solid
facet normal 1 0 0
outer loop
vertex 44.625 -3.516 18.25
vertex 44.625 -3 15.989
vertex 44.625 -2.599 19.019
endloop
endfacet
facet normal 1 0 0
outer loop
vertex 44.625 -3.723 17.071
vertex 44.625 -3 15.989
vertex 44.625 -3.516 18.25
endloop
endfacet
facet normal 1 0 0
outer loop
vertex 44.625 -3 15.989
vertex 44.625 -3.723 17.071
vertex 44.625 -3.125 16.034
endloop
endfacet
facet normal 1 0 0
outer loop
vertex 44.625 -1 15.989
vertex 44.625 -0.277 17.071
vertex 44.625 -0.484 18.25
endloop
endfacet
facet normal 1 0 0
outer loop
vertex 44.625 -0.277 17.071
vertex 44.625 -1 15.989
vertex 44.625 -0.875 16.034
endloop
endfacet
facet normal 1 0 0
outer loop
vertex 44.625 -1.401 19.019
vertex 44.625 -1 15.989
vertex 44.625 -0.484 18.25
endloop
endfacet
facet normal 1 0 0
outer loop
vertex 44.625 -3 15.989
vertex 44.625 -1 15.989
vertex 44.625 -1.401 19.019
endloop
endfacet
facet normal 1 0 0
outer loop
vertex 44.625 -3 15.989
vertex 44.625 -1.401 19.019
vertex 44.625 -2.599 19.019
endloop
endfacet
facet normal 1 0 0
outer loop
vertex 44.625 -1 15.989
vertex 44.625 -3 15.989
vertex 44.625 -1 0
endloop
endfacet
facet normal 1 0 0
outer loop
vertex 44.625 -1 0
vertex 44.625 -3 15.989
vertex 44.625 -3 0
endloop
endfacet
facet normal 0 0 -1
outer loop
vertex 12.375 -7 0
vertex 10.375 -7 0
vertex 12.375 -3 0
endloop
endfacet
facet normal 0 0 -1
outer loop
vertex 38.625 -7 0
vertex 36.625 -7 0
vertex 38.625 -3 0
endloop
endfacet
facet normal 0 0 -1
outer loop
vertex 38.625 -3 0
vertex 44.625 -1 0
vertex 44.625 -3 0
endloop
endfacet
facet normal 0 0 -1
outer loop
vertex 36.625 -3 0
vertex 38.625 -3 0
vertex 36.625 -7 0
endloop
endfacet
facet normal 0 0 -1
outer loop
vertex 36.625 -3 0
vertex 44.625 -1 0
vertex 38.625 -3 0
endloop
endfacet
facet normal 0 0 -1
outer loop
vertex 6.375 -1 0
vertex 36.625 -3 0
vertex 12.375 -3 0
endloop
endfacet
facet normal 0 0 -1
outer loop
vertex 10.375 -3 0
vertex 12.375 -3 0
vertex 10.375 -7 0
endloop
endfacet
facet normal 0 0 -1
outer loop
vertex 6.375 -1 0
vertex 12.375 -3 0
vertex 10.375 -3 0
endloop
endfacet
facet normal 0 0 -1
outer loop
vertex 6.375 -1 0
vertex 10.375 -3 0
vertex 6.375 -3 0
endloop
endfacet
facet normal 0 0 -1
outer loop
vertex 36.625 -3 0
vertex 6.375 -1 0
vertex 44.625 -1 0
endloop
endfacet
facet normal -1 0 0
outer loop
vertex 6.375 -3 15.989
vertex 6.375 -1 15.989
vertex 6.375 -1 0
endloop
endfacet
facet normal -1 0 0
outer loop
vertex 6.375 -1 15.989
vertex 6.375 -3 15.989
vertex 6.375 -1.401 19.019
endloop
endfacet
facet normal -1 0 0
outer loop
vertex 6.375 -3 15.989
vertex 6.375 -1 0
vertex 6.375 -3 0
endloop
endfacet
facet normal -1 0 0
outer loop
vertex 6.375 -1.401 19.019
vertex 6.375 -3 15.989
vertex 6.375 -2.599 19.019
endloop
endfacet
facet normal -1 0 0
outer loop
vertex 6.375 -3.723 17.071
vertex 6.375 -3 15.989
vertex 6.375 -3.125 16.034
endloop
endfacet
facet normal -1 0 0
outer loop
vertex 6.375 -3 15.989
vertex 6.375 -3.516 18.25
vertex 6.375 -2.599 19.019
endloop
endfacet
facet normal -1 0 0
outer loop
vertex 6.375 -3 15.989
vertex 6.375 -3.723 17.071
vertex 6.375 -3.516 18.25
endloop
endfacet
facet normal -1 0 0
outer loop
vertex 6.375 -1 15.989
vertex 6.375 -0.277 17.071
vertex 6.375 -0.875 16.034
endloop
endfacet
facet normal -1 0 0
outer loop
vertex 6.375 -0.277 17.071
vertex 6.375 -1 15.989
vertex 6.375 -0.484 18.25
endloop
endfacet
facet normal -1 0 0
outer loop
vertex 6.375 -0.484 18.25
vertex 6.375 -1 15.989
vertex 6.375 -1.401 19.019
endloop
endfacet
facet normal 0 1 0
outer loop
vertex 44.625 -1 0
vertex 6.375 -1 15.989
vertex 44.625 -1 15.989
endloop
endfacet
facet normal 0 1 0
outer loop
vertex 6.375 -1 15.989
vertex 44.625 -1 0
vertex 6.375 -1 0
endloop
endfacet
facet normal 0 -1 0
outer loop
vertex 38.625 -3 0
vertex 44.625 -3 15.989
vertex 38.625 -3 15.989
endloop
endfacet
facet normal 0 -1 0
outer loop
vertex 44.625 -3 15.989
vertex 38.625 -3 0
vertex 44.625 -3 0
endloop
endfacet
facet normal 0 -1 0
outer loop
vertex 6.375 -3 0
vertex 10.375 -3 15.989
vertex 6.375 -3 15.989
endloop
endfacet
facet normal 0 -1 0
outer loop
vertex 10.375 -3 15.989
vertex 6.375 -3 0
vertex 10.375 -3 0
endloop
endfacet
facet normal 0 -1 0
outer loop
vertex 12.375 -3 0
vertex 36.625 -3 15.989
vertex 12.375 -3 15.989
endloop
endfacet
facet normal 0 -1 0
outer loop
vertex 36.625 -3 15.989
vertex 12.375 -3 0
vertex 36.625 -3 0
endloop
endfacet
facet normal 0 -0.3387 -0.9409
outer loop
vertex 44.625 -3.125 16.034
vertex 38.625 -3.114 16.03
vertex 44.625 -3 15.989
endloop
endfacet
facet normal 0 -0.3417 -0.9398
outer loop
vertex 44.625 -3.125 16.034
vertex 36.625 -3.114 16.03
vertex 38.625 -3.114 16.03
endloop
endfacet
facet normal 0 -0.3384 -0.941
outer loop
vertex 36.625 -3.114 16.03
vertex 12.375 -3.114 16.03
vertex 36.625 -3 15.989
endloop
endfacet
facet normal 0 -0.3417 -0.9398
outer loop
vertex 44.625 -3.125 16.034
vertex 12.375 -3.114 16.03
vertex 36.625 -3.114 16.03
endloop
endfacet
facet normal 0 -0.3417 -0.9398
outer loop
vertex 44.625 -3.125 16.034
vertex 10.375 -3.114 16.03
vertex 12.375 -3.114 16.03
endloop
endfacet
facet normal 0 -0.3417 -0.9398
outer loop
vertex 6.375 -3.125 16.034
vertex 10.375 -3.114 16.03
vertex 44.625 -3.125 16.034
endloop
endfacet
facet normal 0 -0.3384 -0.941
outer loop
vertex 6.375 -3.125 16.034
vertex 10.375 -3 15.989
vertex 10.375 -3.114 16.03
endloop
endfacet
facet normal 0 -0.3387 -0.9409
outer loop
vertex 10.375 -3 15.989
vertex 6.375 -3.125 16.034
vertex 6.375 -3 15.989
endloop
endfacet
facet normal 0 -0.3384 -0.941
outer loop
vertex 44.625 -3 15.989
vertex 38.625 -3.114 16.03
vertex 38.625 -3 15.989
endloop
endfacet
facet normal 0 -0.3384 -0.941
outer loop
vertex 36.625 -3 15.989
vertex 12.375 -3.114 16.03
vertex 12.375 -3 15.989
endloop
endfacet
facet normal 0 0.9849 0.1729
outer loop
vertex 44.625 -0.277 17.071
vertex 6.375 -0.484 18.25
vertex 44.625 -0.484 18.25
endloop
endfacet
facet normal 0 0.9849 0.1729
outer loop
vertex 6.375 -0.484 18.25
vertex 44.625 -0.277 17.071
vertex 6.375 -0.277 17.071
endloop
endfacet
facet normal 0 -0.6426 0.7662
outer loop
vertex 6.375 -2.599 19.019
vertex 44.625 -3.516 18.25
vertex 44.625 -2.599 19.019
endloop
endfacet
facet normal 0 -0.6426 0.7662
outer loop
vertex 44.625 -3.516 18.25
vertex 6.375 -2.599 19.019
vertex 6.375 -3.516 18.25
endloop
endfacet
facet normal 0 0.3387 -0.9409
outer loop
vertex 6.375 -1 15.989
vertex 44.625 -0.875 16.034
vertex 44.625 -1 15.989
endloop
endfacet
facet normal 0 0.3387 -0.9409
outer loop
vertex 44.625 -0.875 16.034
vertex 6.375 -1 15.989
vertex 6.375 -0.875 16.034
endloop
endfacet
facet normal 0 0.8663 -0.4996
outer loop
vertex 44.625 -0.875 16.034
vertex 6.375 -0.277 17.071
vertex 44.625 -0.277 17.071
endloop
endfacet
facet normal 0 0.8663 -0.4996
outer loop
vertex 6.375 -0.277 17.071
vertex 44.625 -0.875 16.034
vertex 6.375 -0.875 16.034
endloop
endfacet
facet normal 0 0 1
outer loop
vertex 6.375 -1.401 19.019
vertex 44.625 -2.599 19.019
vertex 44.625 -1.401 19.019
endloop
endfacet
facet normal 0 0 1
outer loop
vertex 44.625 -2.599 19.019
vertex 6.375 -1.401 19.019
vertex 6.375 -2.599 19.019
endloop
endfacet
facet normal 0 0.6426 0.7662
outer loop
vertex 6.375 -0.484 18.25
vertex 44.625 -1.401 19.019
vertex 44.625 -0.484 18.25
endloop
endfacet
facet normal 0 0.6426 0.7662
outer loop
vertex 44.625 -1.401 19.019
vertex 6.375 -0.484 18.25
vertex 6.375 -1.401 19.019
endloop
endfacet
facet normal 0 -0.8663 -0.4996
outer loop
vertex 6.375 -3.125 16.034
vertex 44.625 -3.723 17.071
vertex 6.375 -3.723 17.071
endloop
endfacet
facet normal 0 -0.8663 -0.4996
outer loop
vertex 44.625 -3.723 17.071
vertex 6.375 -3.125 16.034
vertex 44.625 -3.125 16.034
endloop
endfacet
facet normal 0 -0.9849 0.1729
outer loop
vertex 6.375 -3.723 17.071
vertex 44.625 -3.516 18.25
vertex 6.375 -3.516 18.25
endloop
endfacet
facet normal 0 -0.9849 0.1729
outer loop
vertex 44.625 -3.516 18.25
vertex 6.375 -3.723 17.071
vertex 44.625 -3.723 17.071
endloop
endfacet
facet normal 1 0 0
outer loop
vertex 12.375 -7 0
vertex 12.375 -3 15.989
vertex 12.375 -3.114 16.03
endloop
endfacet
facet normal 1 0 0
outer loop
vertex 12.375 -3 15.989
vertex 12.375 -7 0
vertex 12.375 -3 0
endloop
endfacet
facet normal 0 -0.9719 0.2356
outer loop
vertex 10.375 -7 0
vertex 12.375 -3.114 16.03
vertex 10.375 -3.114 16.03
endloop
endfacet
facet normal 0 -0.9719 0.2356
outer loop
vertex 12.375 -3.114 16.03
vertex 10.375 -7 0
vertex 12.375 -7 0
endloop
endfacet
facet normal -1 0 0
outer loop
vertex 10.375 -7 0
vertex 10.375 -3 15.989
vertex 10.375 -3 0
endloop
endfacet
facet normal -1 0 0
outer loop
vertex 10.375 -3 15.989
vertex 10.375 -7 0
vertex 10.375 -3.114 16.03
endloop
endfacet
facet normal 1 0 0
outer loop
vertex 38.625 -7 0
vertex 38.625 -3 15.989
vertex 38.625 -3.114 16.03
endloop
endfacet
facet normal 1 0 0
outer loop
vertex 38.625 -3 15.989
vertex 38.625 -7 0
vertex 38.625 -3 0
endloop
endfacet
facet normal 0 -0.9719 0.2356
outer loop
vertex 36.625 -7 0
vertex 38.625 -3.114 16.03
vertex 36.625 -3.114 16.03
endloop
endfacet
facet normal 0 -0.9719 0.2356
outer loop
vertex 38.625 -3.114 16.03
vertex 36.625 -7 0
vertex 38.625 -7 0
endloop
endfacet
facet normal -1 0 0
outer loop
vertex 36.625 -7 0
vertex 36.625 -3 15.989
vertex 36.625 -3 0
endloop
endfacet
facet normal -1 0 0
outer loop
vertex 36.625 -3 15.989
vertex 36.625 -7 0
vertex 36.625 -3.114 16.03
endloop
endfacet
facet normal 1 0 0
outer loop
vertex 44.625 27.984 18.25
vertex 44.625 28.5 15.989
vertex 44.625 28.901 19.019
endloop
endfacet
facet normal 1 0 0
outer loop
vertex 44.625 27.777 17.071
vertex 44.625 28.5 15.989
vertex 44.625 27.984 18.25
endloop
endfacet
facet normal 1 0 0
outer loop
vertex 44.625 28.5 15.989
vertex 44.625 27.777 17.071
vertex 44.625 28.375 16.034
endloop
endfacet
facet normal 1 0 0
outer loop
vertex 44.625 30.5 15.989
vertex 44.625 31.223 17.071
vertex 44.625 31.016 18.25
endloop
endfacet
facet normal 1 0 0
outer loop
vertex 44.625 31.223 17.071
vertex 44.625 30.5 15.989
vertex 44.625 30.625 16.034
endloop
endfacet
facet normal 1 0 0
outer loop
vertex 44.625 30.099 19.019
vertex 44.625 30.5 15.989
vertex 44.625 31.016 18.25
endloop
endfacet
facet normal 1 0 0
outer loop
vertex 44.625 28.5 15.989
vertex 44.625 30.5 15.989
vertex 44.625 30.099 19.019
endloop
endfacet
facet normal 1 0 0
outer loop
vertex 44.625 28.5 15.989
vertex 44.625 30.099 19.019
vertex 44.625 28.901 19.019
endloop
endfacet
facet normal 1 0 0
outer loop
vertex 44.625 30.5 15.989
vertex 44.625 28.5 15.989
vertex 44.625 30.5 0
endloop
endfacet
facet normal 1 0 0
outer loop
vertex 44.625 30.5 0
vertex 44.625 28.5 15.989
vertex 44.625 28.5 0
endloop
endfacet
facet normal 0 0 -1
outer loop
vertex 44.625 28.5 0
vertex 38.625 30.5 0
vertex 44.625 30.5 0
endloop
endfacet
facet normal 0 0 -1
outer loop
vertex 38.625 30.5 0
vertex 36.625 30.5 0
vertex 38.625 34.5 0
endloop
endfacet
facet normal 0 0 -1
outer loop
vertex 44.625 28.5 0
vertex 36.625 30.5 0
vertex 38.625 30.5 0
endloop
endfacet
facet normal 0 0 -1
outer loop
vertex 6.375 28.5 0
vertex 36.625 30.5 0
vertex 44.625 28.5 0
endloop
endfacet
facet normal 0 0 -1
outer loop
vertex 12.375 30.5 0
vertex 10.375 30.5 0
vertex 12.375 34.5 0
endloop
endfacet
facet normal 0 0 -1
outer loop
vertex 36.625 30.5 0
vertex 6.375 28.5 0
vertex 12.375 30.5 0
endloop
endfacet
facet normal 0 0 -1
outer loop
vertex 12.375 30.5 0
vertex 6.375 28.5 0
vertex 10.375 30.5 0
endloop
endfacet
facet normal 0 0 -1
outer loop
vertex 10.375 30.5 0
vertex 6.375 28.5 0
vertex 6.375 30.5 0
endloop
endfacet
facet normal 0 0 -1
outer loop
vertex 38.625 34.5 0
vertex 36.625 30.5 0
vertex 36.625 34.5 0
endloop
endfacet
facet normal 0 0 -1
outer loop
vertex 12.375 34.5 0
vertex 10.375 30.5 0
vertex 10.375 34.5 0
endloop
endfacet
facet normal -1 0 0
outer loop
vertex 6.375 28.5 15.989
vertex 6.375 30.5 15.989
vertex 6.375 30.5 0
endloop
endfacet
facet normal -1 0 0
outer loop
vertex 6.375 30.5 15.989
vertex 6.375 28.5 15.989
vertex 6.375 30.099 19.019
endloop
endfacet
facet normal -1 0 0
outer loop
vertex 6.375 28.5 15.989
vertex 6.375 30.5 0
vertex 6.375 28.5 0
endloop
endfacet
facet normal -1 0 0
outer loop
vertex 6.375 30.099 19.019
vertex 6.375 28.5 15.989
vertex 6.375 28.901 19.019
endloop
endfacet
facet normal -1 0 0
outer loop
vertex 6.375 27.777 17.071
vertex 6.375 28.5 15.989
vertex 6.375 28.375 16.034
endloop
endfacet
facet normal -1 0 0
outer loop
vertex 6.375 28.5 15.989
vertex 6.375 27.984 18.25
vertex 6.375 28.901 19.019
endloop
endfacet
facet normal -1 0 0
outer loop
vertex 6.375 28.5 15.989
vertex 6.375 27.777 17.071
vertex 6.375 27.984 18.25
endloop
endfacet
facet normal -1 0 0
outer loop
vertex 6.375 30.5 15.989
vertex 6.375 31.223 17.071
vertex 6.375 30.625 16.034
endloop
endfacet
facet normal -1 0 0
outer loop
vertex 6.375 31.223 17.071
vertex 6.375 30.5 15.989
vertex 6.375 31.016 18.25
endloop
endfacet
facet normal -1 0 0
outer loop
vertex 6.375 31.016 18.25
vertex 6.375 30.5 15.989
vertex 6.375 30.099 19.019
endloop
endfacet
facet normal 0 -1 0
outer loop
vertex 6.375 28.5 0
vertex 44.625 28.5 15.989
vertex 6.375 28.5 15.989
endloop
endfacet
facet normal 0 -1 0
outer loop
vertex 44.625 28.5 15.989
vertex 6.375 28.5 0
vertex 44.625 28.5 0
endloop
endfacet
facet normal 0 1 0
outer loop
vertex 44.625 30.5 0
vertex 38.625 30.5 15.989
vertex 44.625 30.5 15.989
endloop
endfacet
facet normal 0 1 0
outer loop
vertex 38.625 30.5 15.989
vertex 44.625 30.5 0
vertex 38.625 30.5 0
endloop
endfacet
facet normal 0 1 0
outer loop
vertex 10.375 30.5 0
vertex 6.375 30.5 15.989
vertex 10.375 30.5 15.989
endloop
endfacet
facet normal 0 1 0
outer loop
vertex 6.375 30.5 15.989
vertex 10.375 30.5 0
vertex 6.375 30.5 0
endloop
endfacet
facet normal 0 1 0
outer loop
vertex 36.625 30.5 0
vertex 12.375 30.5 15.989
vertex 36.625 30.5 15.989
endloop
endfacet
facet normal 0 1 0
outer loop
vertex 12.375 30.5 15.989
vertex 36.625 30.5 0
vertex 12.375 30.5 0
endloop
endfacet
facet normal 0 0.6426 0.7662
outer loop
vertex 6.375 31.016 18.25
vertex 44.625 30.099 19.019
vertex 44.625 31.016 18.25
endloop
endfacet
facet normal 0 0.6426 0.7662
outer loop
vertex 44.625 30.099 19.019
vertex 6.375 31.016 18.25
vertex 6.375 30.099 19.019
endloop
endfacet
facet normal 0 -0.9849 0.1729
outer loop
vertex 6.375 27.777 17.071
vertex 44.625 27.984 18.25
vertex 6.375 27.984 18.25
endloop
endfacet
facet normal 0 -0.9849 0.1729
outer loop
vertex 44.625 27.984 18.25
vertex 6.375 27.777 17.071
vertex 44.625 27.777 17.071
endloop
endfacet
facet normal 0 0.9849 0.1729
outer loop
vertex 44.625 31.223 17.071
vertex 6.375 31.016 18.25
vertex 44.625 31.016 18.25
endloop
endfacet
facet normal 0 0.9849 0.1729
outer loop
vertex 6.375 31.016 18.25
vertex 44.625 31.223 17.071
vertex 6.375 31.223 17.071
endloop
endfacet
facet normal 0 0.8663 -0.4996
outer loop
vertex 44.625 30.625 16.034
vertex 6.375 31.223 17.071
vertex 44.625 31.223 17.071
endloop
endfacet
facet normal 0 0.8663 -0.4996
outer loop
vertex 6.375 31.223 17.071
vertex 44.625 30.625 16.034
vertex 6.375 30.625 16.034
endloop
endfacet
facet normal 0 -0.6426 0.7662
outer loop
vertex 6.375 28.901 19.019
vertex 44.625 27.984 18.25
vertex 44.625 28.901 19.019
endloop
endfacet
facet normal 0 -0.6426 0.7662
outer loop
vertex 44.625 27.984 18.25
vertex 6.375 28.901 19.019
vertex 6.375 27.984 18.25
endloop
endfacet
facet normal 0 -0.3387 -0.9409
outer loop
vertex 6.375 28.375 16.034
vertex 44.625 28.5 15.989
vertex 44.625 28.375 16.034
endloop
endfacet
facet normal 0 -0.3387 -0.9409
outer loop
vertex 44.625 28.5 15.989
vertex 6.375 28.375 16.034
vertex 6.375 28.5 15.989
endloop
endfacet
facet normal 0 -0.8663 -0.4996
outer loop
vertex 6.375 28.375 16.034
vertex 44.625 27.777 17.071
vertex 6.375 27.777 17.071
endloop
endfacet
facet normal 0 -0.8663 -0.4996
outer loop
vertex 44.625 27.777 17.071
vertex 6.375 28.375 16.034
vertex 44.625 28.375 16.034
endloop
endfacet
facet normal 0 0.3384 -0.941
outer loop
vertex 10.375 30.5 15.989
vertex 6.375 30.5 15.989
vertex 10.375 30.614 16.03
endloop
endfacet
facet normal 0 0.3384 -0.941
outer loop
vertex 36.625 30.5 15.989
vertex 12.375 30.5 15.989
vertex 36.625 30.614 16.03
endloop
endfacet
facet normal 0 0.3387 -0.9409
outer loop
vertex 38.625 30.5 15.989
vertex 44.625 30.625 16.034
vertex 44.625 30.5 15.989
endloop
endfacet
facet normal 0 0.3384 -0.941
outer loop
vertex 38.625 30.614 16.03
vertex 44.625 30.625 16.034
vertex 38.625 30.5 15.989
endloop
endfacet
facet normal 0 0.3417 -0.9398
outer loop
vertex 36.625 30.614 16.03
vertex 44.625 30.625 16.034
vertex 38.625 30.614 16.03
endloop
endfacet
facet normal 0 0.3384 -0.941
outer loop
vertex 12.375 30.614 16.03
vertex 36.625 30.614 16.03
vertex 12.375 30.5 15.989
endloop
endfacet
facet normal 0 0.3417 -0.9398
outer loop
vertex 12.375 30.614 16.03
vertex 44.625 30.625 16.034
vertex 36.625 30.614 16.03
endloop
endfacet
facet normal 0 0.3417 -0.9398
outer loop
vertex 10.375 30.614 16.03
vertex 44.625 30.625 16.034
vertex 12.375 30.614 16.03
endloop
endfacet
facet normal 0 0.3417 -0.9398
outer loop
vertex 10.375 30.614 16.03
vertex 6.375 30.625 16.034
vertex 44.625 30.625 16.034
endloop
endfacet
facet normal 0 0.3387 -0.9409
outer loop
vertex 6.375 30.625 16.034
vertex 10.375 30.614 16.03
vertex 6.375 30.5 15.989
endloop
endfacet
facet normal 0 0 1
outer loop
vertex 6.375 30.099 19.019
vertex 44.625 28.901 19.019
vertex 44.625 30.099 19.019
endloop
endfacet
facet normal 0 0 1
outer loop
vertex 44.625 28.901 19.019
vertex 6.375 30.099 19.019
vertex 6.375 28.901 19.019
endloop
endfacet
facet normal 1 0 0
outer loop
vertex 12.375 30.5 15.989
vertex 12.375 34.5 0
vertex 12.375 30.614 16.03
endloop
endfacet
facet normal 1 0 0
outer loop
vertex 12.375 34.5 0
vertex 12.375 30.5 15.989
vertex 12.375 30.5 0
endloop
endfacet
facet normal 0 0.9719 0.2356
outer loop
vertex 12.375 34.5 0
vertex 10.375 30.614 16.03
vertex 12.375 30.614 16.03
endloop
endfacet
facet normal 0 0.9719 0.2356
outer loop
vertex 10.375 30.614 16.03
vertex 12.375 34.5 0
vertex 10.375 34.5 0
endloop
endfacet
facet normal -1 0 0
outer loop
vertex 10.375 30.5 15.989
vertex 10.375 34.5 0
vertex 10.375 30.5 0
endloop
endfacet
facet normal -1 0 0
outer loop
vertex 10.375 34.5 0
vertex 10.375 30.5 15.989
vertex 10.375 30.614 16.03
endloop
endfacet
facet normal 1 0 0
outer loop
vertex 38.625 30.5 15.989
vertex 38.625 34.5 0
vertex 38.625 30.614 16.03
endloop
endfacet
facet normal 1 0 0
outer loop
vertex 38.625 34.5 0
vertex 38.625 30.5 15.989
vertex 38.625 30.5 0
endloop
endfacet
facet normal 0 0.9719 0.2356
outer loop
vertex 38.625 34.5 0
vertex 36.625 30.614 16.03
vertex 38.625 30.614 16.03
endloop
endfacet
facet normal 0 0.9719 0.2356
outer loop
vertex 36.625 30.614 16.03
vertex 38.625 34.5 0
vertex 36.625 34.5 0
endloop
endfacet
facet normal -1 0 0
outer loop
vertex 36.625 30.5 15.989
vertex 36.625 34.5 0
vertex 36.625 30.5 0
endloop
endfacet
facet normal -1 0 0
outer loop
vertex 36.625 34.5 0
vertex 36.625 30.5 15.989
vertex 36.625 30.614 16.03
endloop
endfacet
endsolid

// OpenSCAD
// file: battery.scad
include <values.scad>;

module battery() {
    cube([BATTERY_WIDTH, BATTERY_LENGTH, BATTERY_HEIGHT]);
}
// file: basic_shapes.scad
module hole_array(xs, diameter, height, y = 0, z = 0) {
    for (x = xs) {
        translate([x, y, z]) {
            cylinder(
                d = diameter,
                h = height
            );
        }
    }
}

module flat_top_rectangular_pyramid(
    top_width = 0,
    top_length = 0,

    bottom_width = 0,
    bottom_length = 0,

    height = 0,

    top_x = undef,
    top_y = undef,

    top_weight_x = .5,
    top_weight_y = .5
) {
    top_x = top_x != undef
        ? top_x
        : (bottom_width - top_width) * top_weight_x;
    top_y = top_y != undef
        ? top_y
        : (bottom_length - top_length) * top_weight_y;

    max_difference = max(bottom_width - top_width, bottom_length - top_length);
    height = height == undef
        ? max_difference / 2
        : height;

    polyhedron(
        [
            [0, 0, 0],
            [bottom_width, 0, 0],
            [bottom_width, bottom_length, 0],
            [0, bottom_length, 0],
            [top_x, top_y, height],
            [top_width + top_x, top_y, height],
            [top_width + top_x, top_length + top_y, height],
            [top_x, top_length + top_y, height]
        ], [
            [0, 1, 2, 3],
            [4, 5, 1, 0],
            [7, 6, 5, 4],
            [5, 6, 2, 1],
            [6, 7, 3, 2],
            [7, 4, 0, 3]
        ]
    );
}

module rounded_cube(dimensions, radius, $fn = $fn) {
    positions = [
        [radius, radius, radius],
        [dimensions.x - radius, radius, radius],
        [dimensions.x - radius, dimensions.y - radius, radius],
        [radius, dimensions.y - radius, radius],
        [radius, radius, dimensions.z - radius],
        [dimensions.x - radius, radius, dimensions.z - radius],
        [dimensions.x - radius, dimensions.y - radius, dimensions.z - radius],
        [radius, dimensions.y - radius, dimensions.z - radius],
    ];

    hull() {
        for (position = positions) {
            translate(position) sphere(r = radius);
        }
    }
}

module rounded_cube_cutout(dimensions, radius, $fn = $fn) {
    e = 0.05678;

    width = dimensions[0] + e * 2;
    length = dimensions[1] + e * 2;
    height = dimensions[2] + e * 2;

    translate([-e, -e, -e]) {
        difference() {
            cube([width, length, height]);

            translate([-e, -e, -e]) {
                rounded_cube(
                    [
                        width + e * 2,
                        length + e * 2,
                        height + e * 2
                    ],
                    radius = radius,
                    $fn = $fn
                );
            }
        }
    }
}

module support_wall(
    dimensions,
    is_back = true,
    railing_diameter = 3.5,
    support_width = 2,
    support_length = 4,
    gutter = 4
) {
    railing_z = railing_diameter / 4;

    module _support(height = dimensions[2], depth = support_length) {
        translate([0, -depth, 0]) {
            flat_top_rectangular_pyramid(
                top_width = support_width,
                top_length = 0,
                bottom_width = support_width,
                bottom_length = support_length,
                height = height,
                top_weight_y = 1
            );
        }
    }

    translate(is_back ? [0, dimensions[1], 0] : [0, 0, 0]) {
        mirror(is_back ? [0, 1, 0] : [0, 0, 0]) {
            cube(dimensions);

            translate([0, dimensions[1] / 2, dimensions[2] + railing_z]) {
                rotate([0, 90, 0]) {
                    cylinder(
                        d = railing_diameter,
                        h = dimensions[0],
                        $fn = 9
                    );
                }
            }

            translate([gutter, 0, 0]) {
                _support();
            }
            translate([dimensions[0] - support_length - gutter, 0, 0]) {
                _support();
            }
        }
    }
}
// file: values.scad
PCB_WIDTH = 114.3;
PCB_LENGTH = 140.97;
PCB_HEIGHT = 1.6;
PCB_MOUNT_HOLE_DIAMETER = 3;

PCB_COMPONENTS_WIDTH = 100;
PCB_COMPONENTS_LENGTH = 103;
PCB_COMPONENTS_HEIGHT = 12;
PCB_COMPONENTS_X = (PCB_WIDTH - PCB_COMPONENTS_WIDTH) / 2;
PCB_COMPONENTS_Y = 33;

BUTTON_DIAMETER = 6;
BUTTON_HEIGHT = 6;

PCB_HOLES = [
    [3.81, 137.16],
    [110.49, 137.16],

    [3.81, 27.94],
    [57.15, 27.94],
    [110.49, 27.94],

    [3.81, 3.81],
    [57.15, 3.81],
    [110.49, 3.81],
];

PCB_BUTTONS = [
    [6.096 - 2.286, 10.922],
    [13.716 - 2.286, 16.002],
    [21.336 - 2.286, 10.922],
    [28.956 - 2.286, 16.002],
    [36.576 - 2.286, 10.922],
    [44.196 - 2.286, 16.002],
    [112.776 - 2.286, 10.922],
    [51.816 - 2.286, 10.922],
    [67.056 - 2.286, 10.922],
    [74.676 - 2.286, 16.002],
    [82.296 - 2.286, 10.922],
    [89.916 - 2.286, 16.002],
    [97.536 - 2.286, 10.922],
];

SCREW_HEAD_DIAMETER = 5.5;
NUT_DIAMETER = 6.4;
NUT_HEIGHT = 2.6;

MOUNT_STILT_MINIMUM_HEIGHT = NUT_HEIGHT + .5 + 2; // TODO: tidy against mount_stilt args

NATURAL_KEY_SEQUENCES = [
    [1,0,1,0,1,1,0,1,0,1,0,1,],
    [0,1,0,1,1,0,1,0,1,0,1,1,],
    [1,0,1,1,0,1,0,1,0,1,1,0,],
    [0,1,1,0,1,0,1,0,1,1,0,1,],
    [1,1,0,1,0,1,0,1,1,0,1,0,],
    [1,0,1,0,1,0,1,1,0,1,0,1,],
    [0,1,0,1,0,1,1,0,1,0,1,1,],
    [1,0,1,0,1,1,0,1,0,1,1,0,],
    [0,1,0,1,1,0,1,0,1,1,0,1,],
    [1,0,1,1,0,1,0,1,1,0,1,0,],
    [0,1,1,0,1,0,1,1,0,1,0,1,],
    [1,1,0,1,0,1,1,0,1,0,1,0,],
];

HINGE_CLASP_DEFAULT_PIN_DIAMETER = 1.75; // filament diameter
HINGE_CLASP_DEFAULT_MINIMAL_SUPPORT = 1.5;
HINGE_CLASP_MINIMUM_TOOTH_WIDTH = 5;
HINGE_CLASP_MINIMUM_TOOTH_COUNT = 5;
HINGE_CLASP_MINIMUM_WIDTH = HINGE_CLASP_MINIMUM_TOOTH_WIDTH
    * HINGE_CLASP_MINIMUM_TOOTH_COUNT;
MINIMUM_HINGE_CLASP_LENGTH = 20;

HINGE_CLASP_SIDE_FRONT_BACK = 0;
HINGE_CLASP_SIDE_LEFT_RIGHT = 1;

LIP_BOX_DEFAULT_LIP_HEIGHT = 3;

BATTERY_WIDTH = 51;
BATTERY_LENGTH = 27.5;
BATTERY_HEIGHT = 16.5;

/* AZ40R https://www.jameco.com/Jameco/Products/ProdDS/2227516.pdf */
SPEAKER_DIAMETER = 40;
SPEAKER_HEIGHT = 5;
SPEAKER_CLEARANCE = 2;

/* C&K PVA2EEH21.7N
https://www.jameco.com/z/PVA2EEH21-7N-C-K-32-Volt-1-AMP-DOUBLE-POLE-DOUBLE-THROW-DPDT-ON-ON-SHORT-STROKE-PUSHBUTTON-SWITCH-PVA2EEH21-7N-C-K_594718.html */
SWITCH_BASE_WIDTH = 8.6;
SWITCH_BASE_LENGTH = 8.6;
SWITCH_BASE_HEIGHT = 8.6;
SWITCH_ACTUATOR_WIDTH = 3;
SWITCH_ACTUATOR_LENGTH = 2;
SWITCH_ACTUATOR_HEIGHT = 5.6;
SWITCH_ACTUATOR_TRAVEL = 1.5;
SWITCH_ORIGIN = [0, 0];
// main file
include <values.scad>;

use <basic_shapes.scad>;
use <battery.scad>;

module battery_snap(
    wall_width = BATTERY_WIDTH * .75,
    wall_length = 2,
    showFrontWall = true,
    showBackWall = true,
    tolerance = 0,
) {
    x = (BATTERY_WIDTH - wall_width) / 2;

    translate([x, -tolerance - wall_length, 0]) {
        if (showFrontWall) {
            support_wall(
                [wall_width, wall_length, BATTERY_HEIGHT],
                is_back = false
            );
        }
    }
    translate([x, BATTERY_LENGTH + tolerance, 0]) {
        if (showBackWall) {
            support_wall(
                [wall_width, wall_length, BATTERY_HEIGHT],
                is_back = true
            );
        }
    }
}

% battery();
battery_snap(tolerance = 1);
